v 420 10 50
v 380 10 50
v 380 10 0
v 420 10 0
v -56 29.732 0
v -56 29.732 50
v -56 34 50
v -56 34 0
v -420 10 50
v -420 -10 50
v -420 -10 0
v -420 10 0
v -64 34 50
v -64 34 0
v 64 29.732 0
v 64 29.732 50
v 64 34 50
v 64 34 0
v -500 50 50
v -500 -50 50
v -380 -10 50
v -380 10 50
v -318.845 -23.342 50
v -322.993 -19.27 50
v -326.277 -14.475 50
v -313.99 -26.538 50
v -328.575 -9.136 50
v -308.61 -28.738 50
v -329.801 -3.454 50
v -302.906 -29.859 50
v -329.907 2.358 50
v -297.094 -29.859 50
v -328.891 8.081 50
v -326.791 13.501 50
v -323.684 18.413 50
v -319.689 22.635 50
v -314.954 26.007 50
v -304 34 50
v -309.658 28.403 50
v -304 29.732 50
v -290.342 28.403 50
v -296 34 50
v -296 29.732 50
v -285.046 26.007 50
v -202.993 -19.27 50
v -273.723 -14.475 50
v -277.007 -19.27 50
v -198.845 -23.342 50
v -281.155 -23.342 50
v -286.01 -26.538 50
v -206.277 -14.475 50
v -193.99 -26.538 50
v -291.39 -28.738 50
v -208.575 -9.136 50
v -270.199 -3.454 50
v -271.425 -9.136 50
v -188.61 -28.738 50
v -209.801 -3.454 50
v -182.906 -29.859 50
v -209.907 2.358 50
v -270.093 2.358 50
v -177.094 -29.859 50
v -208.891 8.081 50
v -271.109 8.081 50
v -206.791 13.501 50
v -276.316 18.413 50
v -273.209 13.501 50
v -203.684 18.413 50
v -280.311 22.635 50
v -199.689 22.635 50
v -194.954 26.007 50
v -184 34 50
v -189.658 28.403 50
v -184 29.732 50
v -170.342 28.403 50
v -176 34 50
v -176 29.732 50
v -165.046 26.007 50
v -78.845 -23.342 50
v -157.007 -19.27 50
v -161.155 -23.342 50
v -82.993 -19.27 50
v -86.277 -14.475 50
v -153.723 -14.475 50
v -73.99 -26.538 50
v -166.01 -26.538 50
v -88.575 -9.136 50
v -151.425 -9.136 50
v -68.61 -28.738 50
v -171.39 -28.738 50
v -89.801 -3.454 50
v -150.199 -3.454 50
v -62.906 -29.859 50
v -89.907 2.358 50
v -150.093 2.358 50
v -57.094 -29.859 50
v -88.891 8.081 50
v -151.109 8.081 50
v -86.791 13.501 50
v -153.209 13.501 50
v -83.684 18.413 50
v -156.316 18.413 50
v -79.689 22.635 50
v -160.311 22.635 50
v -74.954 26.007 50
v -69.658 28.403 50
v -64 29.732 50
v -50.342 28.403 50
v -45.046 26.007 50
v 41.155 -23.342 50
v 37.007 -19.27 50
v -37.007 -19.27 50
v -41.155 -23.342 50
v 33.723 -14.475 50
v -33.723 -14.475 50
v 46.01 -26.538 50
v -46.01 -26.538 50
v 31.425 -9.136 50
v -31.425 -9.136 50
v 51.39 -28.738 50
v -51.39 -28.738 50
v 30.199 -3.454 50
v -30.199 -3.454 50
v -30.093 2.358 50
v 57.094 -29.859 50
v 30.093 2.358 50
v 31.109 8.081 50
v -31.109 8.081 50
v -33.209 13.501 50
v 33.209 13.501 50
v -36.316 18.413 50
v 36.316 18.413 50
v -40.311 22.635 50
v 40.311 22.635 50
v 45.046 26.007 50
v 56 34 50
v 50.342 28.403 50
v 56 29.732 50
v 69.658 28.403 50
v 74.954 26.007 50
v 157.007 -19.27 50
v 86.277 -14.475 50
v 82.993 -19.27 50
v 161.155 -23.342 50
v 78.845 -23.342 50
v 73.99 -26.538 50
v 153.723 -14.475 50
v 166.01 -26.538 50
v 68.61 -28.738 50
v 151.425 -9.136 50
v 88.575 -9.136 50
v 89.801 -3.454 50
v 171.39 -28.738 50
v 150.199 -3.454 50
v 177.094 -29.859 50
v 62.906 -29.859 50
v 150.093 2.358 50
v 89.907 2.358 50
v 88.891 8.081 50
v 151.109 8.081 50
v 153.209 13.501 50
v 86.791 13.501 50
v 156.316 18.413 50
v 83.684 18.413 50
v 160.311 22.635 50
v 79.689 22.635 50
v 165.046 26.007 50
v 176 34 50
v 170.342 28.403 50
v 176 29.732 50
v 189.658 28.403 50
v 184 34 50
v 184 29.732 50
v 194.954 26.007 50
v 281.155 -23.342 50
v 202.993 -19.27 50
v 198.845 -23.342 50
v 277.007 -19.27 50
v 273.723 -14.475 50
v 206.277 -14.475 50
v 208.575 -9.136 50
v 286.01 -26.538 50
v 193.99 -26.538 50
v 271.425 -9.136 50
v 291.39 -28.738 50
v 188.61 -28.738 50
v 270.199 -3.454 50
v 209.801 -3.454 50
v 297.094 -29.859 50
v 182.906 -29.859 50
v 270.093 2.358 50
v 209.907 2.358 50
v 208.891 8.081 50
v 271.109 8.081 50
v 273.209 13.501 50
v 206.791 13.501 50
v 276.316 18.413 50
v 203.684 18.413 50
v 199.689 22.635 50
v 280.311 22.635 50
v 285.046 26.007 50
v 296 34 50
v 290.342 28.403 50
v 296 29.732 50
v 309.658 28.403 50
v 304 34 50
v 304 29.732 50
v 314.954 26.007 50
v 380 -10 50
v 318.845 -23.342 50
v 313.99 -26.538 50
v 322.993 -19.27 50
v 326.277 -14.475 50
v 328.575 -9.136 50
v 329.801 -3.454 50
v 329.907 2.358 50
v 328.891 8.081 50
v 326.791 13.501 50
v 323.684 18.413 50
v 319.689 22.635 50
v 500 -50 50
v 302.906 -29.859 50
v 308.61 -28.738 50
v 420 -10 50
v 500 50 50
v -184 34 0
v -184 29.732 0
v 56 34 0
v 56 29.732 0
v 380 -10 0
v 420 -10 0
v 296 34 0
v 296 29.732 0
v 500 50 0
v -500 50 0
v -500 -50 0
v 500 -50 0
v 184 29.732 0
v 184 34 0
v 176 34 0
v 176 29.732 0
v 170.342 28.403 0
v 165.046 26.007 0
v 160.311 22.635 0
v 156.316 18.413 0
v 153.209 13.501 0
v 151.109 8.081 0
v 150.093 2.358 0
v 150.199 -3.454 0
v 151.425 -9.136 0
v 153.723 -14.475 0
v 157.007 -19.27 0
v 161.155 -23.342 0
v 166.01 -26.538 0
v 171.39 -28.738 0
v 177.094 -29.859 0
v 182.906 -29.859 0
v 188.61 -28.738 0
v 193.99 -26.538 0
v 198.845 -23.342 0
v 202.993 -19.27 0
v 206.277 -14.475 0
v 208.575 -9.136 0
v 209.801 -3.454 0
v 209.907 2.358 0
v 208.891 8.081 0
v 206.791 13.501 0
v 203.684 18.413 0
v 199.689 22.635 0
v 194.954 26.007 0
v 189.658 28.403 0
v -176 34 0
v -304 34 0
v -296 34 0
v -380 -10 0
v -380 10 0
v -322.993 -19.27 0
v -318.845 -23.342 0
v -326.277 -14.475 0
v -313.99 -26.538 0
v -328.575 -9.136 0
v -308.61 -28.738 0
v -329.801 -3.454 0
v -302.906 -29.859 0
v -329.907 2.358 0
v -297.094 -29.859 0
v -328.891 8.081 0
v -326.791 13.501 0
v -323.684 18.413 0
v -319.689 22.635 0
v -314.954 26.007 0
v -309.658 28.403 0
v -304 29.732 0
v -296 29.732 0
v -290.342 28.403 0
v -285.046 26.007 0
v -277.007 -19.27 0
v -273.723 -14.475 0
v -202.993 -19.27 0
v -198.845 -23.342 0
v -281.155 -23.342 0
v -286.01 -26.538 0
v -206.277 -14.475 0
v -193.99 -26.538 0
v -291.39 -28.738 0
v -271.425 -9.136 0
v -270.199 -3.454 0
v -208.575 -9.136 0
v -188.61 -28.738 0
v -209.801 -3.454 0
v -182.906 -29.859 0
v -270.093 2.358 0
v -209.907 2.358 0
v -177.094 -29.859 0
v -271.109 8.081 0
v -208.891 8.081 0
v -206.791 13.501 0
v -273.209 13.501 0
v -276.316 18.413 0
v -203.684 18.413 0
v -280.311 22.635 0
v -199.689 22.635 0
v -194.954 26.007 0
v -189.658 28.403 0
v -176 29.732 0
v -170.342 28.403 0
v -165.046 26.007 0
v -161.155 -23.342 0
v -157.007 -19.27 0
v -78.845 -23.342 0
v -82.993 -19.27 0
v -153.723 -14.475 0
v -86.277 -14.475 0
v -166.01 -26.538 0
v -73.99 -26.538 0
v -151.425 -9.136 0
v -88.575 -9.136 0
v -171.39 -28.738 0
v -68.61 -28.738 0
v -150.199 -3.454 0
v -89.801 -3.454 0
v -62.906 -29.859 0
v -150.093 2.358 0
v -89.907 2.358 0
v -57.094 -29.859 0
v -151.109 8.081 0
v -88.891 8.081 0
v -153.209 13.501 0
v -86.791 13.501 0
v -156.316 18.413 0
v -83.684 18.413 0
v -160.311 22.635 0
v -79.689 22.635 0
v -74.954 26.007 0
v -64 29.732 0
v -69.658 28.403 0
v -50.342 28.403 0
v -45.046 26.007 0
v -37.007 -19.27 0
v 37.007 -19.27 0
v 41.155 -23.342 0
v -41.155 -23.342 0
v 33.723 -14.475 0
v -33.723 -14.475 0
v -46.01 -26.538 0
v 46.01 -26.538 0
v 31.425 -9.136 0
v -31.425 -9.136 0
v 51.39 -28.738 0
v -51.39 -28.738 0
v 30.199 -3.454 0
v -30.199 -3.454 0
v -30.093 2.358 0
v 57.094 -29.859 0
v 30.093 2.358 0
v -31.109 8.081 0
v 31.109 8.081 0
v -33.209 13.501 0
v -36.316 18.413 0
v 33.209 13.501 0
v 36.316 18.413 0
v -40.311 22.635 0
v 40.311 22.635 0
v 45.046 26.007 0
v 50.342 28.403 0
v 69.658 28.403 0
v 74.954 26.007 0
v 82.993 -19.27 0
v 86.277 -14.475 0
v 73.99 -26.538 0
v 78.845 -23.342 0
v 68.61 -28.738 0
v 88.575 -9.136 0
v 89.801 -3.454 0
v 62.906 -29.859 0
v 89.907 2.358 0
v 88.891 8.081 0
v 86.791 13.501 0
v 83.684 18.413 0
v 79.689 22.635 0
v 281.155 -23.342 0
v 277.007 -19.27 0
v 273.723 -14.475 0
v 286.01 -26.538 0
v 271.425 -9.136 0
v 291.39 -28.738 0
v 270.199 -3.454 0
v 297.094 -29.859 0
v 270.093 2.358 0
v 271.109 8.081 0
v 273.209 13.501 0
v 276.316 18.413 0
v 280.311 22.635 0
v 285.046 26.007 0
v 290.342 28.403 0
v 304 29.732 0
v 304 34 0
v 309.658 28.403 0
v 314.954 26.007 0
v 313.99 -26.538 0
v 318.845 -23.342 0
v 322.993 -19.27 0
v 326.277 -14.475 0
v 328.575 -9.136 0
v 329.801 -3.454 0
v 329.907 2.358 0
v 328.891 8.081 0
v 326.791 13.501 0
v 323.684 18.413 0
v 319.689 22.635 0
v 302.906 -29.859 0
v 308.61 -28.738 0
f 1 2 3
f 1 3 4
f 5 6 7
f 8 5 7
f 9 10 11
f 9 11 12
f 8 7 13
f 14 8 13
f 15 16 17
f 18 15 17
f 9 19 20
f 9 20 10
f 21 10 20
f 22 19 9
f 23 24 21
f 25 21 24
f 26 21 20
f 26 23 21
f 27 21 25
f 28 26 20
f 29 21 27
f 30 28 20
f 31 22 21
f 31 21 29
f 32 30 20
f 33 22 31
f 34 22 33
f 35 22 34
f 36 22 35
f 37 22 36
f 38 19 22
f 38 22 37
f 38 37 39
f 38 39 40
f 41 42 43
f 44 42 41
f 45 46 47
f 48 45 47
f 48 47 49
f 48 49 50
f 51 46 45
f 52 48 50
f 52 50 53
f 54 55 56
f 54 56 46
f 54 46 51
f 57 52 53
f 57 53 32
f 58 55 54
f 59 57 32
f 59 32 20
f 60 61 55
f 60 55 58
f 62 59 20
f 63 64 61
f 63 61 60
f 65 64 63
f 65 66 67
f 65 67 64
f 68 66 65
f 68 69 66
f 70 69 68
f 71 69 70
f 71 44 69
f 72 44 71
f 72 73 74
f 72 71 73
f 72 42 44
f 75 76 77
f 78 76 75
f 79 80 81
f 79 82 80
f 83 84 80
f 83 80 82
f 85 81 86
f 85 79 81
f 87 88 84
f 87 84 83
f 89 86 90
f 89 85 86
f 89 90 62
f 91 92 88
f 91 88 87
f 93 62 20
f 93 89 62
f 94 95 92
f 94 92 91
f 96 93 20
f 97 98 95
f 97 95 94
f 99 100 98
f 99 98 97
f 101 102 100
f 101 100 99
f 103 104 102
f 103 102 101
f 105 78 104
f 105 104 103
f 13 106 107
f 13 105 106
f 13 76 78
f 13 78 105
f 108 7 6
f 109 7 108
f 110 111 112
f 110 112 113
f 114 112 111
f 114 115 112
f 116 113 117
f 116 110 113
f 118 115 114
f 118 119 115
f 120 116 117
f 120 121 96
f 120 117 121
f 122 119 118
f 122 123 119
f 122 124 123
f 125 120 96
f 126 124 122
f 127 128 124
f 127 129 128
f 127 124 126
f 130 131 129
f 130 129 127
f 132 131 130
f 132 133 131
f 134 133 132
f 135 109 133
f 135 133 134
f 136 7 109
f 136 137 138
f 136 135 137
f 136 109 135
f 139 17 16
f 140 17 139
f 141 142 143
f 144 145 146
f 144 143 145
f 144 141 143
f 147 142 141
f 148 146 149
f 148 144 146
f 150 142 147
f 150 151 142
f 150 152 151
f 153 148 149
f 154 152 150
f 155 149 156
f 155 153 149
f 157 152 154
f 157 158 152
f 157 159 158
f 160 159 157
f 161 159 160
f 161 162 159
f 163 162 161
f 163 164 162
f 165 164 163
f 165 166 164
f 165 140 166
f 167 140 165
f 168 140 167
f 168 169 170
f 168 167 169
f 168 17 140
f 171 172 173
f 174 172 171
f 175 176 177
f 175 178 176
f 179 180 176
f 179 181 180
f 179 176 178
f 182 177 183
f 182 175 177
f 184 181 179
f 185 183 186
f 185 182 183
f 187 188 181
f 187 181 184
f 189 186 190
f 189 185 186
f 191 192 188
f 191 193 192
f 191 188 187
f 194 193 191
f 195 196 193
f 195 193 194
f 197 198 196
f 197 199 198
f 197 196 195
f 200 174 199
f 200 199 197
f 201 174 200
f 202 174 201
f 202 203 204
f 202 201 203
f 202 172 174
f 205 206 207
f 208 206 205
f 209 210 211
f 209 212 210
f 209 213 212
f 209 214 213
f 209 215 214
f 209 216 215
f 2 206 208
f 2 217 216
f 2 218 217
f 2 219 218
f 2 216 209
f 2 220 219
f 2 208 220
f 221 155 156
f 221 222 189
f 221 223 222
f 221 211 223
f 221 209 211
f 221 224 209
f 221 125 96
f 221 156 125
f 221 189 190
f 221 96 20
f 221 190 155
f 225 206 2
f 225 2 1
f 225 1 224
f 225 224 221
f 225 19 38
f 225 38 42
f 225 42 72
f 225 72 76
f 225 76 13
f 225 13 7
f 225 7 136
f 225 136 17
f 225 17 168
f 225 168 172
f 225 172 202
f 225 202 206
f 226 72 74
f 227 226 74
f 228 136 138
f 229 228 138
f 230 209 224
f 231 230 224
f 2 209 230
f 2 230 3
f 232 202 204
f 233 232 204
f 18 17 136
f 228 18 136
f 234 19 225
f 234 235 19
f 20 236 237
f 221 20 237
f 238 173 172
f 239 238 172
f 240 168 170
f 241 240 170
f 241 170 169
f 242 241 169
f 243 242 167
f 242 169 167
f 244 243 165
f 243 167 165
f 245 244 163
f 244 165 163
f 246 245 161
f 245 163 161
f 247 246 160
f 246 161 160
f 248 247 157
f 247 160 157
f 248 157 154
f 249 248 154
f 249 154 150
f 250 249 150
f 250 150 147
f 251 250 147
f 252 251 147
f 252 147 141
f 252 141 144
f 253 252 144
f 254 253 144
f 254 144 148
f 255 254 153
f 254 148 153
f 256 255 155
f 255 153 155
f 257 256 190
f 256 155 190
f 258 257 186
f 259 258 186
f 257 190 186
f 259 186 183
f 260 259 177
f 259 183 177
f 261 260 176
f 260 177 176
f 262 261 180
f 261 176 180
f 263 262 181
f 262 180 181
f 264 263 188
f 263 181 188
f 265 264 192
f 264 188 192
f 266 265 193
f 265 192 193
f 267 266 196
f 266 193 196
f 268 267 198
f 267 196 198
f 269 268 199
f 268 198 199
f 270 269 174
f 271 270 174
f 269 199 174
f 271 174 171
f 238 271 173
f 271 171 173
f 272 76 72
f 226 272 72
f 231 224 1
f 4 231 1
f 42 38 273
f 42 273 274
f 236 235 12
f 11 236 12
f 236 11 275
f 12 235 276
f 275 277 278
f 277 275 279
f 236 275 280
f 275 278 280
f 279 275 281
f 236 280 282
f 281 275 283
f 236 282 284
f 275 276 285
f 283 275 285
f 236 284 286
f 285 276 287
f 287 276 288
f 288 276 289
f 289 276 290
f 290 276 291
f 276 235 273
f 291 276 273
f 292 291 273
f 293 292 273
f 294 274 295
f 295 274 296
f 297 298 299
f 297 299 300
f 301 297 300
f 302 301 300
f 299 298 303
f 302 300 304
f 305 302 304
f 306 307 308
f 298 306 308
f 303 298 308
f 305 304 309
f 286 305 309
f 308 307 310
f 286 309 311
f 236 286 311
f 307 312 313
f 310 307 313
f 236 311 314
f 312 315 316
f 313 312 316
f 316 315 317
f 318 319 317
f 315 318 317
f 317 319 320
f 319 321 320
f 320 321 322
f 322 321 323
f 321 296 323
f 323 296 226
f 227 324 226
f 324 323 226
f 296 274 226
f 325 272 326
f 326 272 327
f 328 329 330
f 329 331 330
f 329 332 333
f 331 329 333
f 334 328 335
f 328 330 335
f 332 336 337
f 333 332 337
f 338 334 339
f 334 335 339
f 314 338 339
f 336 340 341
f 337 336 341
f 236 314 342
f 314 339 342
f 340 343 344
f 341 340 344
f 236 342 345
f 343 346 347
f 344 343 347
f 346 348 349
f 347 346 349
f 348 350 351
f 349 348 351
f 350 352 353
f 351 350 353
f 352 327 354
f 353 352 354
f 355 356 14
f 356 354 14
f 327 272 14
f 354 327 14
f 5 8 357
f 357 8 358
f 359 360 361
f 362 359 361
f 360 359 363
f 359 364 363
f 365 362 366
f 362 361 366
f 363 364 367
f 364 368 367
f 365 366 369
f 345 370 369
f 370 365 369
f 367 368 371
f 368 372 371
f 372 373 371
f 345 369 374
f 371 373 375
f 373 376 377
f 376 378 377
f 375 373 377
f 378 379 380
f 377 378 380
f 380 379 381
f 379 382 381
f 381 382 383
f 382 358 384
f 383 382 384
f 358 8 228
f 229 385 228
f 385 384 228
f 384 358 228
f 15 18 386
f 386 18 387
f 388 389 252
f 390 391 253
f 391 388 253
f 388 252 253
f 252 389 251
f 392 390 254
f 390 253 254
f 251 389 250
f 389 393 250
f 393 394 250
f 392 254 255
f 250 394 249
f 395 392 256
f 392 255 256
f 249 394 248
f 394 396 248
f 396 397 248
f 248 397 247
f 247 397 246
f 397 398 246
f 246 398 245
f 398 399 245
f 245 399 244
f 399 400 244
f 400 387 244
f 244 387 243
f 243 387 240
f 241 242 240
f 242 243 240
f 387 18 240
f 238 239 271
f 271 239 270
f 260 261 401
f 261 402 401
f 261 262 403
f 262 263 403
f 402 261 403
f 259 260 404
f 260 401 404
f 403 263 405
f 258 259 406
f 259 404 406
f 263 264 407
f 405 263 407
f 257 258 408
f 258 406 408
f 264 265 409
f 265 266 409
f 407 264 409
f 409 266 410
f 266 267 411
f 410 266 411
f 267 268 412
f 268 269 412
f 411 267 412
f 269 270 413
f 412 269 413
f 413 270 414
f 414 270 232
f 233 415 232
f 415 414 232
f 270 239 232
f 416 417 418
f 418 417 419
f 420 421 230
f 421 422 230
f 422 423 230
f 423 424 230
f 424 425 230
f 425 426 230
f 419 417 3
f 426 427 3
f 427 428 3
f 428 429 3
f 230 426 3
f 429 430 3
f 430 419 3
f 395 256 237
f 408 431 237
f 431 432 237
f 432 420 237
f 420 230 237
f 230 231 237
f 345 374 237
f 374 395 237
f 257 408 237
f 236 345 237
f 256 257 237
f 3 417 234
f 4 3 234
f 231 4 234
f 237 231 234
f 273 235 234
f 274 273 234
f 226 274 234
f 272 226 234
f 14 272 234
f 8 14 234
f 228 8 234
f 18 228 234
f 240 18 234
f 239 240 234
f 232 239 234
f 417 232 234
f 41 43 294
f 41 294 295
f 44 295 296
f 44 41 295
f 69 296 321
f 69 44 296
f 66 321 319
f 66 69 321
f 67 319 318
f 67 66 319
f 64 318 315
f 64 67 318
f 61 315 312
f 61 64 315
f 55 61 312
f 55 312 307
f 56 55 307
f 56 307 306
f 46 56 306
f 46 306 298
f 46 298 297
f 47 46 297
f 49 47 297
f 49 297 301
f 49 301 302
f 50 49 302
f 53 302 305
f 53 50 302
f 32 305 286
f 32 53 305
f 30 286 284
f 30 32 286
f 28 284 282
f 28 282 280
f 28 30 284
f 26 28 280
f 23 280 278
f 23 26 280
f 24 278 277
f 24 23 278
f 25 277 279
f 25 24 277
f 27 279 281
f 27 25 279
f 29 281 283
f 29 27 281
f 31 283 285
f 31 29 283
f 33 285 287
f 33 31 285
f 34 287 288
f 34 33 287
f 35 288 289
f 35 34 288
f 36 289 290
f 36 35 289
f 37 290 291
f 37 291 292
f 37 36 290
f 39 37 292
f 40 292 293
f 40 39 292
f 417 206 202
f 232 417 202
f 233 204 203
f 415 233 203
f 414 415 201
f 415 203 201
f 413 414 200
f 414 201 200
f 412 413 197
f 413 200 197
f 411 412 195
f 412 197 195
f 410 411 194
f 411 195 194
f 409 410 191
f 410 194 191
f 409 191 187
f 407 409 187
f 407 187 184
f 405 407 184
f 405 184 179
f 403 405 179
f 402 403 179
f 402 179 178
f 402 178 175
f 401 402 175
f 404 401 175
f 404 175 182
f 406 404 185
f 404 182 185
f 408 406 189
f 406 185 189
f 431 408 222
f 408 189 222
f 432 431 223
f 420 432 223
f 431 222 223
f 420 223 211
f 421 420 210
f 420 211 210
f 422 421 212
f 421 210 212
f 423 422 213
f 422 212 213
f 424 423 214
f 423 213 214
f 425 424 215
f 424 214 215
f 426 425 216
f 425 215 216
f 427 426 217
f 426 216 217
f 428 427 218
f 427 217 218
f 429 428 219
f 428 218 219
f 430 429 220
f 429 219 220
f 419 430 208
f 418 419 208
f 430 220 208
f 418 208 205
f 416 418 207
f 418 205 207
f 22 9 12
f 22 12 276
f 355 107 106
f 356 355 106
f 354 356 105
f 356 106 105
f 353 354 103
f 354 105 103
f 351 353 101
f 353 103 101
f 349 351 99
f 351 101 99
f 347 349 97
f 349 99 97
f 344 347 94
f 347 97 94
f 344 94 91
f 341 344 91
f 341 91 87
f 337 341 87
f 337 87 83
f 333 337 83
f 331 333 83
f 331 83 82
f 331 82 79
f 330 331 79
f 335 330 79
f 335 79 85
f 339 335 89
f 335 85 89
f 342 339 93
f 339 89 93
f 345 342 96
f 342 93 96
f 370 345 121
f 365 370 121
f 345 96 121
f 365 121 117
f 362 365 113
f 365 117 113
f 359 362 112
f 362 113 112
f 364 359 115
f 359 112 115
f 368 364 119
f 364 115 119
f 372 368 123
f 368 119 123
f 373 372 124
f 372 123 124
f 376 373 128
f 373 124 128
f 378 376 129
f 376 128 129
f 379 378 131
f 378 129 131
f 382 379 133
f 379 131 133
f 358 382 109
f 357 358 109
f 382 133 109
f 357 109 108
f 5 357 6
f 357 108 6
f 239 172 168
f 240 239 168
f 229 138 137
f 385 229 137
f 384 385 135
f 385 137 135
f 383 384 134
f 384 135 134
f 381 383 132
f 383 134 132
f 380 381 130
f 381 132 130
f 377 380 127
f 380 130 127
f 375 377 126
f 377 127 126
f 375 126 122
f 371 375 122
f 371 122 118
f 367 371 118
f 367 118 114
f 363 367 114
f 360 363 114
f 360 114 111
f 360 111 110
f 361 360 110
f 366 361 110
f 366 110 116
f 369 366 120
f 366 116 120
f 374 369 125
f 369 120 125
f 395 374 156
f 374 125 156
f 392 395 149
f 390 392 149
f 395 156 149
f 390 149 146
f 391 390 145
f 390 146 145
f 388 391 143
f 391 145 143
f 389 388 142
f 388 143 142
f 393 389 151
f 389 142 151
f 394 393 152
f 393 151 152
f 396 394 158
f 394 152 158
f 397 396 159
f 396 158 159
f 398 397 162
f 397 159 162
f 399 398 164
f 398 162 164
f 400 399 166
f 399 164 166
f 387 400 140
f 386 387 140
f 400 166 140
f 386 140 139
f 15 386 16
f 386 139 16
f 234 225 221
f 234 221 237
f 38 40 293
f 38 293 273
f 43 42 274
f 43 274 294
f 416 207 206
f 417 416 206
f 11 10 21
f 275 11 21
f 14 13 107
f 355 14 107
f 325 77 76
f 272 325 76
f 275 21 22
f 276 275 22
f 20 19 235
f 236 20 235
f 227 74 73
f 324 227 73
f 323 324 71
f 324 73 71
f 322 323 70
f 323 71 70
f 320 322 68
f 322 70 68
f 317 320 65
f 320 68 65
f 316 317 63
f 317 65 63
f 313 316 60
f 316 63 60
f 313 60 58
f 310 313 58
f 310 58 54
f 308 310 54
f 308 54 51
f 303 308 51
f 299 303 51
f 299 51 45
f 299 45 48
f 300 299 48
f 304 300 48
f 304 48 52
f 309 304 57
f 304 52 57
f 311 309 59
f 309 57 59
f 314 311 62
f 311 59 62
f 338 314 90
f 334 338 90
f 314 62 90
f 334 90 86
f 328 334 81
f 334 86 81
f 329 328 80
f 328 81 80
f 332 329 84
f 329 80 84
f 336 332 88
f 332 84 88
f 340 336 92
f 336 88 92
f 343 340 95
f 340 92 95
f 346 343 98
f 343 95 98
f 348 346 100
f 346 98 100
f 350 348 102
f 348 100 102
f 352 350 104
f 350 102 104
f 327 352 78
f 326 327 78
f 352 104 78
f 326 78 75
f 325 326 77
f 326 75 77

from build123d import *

# Parameters (mm, degrees)
SKETCH1_W           = 900
SKETCH1_H           = 100
BOSS_EXTRUDE1_DEPTH = 50
SKETCH2_W           = 40
SKETCH2_H           = 20
CUT_EXTRUDE1_DEPTH  = 50
SKETCH3_W           = 50
SKETCH3_H           = 50
BOSS_EXTRUDE2_DEPTH = 100


with BuildPart() as part:
    # Sketch1 → Boss-Extrude1 (new body)
    with BuildSketch(Plane.XY):
        Rectangle(SKETCH1_W, SKETCH1_H)
    extrude(amount=BOSS_EXTRUDE1_DEPTH)

    # Sketch2 → Cut-Extrude1 (cut)
    with BuildSketch(Plane.XY.offset(50)):
        with Locations((-400, 0)):
            Rectangle(SKETCH2_W, SKETCH2_H)
        with BuildLine():
            Line((-180, 34), (-184, 34))
            Line((-184, 34), (-184, 29.732137495))
            ThreePointArc((-184, 29.732137495), (-180, -30), (-176, 29.732137495))
            Line((-176, 29.732137495), (-176, 34))
            Line((-176, 34), (-180, 34))
        make_face()
        with Locations((400, 0)):
            Rectangle(SKETCH2_W, SKETCH2_H)
        with BuildLine():
            Line((-300, 34), (-296, 34))
            Line((-296, 34), (-296, 29.732137495))
            ThreePointArc((-296, 29.732137495), (-300, -30), (-304, 29.732137495))
            Line((-304, 29.732137495), (-304, 34))
            Line((-304, 34), (-300, 34))
        make_face()
        with BuildLine():
            Line((-60, 34), (-64, 34))
            Line((-64, 34), (-64, 29.732137495))
            ThreePointArc((-64, 29.732137495), (-60, -30), (-56, 29.732137495))
            Line((-56, 29.732137495), (-56, 34))
            Line((-56, 34), (-60, 34))
        make_face()
        with BuildLine():
            Line((60, 34), (56, 34))
            Line((56, 34), (56, 29.732137495))
            ThreePointArc((56, 29.732137495), (60, -30), (64, 29.732137495))
            Line((64, 29.732137495), (64, 34))
            Line((64, 34), (60, 34))
        make_face()
        with BuildLine():
            Line((180, 34), (176, 34))
            Line((176, 34), (176, 29.732137495))
            ThreePointArc((176, 29.732137495), (180, -30), (184, 29.732137495))
            Line((184, 29.732137495), (184, 34))
            Line((184, 34), (180, 34))
        make_face()
        with BuildLine():
            Line((300, 34), (296, 34))
            Line((296, 34), (296, 29.732137495))
            ThreePointArc((296, 29.732137495), (300, -30), (304, 29.732137495))
            Line((304, 29.732137495), (304, 34))
            Line((304, 34), (300, 34))
        make_face()
    extrude(amount=-CUT_EXTRUDE1_DEPTH, mode=Mode.SUBTRACT)

    # Sketch3 → Boss-Extrude2 (add)
    with BuildSketch(Plane(origin=(0, 50, 0), x_dir=(1, 0, 0), z_dir=(0, 1, 0))):
        with Locations((475, -25)):
            Rectangle(SKETCH3_W, SKETCH3_H)
        with Locations((-475, -25)):
            Rectangle(SKETCH3_W, SKETCH3_H)
    extrude(amount=-BOSS_EXTRUDE2_DEPTH)


solid = part.part
